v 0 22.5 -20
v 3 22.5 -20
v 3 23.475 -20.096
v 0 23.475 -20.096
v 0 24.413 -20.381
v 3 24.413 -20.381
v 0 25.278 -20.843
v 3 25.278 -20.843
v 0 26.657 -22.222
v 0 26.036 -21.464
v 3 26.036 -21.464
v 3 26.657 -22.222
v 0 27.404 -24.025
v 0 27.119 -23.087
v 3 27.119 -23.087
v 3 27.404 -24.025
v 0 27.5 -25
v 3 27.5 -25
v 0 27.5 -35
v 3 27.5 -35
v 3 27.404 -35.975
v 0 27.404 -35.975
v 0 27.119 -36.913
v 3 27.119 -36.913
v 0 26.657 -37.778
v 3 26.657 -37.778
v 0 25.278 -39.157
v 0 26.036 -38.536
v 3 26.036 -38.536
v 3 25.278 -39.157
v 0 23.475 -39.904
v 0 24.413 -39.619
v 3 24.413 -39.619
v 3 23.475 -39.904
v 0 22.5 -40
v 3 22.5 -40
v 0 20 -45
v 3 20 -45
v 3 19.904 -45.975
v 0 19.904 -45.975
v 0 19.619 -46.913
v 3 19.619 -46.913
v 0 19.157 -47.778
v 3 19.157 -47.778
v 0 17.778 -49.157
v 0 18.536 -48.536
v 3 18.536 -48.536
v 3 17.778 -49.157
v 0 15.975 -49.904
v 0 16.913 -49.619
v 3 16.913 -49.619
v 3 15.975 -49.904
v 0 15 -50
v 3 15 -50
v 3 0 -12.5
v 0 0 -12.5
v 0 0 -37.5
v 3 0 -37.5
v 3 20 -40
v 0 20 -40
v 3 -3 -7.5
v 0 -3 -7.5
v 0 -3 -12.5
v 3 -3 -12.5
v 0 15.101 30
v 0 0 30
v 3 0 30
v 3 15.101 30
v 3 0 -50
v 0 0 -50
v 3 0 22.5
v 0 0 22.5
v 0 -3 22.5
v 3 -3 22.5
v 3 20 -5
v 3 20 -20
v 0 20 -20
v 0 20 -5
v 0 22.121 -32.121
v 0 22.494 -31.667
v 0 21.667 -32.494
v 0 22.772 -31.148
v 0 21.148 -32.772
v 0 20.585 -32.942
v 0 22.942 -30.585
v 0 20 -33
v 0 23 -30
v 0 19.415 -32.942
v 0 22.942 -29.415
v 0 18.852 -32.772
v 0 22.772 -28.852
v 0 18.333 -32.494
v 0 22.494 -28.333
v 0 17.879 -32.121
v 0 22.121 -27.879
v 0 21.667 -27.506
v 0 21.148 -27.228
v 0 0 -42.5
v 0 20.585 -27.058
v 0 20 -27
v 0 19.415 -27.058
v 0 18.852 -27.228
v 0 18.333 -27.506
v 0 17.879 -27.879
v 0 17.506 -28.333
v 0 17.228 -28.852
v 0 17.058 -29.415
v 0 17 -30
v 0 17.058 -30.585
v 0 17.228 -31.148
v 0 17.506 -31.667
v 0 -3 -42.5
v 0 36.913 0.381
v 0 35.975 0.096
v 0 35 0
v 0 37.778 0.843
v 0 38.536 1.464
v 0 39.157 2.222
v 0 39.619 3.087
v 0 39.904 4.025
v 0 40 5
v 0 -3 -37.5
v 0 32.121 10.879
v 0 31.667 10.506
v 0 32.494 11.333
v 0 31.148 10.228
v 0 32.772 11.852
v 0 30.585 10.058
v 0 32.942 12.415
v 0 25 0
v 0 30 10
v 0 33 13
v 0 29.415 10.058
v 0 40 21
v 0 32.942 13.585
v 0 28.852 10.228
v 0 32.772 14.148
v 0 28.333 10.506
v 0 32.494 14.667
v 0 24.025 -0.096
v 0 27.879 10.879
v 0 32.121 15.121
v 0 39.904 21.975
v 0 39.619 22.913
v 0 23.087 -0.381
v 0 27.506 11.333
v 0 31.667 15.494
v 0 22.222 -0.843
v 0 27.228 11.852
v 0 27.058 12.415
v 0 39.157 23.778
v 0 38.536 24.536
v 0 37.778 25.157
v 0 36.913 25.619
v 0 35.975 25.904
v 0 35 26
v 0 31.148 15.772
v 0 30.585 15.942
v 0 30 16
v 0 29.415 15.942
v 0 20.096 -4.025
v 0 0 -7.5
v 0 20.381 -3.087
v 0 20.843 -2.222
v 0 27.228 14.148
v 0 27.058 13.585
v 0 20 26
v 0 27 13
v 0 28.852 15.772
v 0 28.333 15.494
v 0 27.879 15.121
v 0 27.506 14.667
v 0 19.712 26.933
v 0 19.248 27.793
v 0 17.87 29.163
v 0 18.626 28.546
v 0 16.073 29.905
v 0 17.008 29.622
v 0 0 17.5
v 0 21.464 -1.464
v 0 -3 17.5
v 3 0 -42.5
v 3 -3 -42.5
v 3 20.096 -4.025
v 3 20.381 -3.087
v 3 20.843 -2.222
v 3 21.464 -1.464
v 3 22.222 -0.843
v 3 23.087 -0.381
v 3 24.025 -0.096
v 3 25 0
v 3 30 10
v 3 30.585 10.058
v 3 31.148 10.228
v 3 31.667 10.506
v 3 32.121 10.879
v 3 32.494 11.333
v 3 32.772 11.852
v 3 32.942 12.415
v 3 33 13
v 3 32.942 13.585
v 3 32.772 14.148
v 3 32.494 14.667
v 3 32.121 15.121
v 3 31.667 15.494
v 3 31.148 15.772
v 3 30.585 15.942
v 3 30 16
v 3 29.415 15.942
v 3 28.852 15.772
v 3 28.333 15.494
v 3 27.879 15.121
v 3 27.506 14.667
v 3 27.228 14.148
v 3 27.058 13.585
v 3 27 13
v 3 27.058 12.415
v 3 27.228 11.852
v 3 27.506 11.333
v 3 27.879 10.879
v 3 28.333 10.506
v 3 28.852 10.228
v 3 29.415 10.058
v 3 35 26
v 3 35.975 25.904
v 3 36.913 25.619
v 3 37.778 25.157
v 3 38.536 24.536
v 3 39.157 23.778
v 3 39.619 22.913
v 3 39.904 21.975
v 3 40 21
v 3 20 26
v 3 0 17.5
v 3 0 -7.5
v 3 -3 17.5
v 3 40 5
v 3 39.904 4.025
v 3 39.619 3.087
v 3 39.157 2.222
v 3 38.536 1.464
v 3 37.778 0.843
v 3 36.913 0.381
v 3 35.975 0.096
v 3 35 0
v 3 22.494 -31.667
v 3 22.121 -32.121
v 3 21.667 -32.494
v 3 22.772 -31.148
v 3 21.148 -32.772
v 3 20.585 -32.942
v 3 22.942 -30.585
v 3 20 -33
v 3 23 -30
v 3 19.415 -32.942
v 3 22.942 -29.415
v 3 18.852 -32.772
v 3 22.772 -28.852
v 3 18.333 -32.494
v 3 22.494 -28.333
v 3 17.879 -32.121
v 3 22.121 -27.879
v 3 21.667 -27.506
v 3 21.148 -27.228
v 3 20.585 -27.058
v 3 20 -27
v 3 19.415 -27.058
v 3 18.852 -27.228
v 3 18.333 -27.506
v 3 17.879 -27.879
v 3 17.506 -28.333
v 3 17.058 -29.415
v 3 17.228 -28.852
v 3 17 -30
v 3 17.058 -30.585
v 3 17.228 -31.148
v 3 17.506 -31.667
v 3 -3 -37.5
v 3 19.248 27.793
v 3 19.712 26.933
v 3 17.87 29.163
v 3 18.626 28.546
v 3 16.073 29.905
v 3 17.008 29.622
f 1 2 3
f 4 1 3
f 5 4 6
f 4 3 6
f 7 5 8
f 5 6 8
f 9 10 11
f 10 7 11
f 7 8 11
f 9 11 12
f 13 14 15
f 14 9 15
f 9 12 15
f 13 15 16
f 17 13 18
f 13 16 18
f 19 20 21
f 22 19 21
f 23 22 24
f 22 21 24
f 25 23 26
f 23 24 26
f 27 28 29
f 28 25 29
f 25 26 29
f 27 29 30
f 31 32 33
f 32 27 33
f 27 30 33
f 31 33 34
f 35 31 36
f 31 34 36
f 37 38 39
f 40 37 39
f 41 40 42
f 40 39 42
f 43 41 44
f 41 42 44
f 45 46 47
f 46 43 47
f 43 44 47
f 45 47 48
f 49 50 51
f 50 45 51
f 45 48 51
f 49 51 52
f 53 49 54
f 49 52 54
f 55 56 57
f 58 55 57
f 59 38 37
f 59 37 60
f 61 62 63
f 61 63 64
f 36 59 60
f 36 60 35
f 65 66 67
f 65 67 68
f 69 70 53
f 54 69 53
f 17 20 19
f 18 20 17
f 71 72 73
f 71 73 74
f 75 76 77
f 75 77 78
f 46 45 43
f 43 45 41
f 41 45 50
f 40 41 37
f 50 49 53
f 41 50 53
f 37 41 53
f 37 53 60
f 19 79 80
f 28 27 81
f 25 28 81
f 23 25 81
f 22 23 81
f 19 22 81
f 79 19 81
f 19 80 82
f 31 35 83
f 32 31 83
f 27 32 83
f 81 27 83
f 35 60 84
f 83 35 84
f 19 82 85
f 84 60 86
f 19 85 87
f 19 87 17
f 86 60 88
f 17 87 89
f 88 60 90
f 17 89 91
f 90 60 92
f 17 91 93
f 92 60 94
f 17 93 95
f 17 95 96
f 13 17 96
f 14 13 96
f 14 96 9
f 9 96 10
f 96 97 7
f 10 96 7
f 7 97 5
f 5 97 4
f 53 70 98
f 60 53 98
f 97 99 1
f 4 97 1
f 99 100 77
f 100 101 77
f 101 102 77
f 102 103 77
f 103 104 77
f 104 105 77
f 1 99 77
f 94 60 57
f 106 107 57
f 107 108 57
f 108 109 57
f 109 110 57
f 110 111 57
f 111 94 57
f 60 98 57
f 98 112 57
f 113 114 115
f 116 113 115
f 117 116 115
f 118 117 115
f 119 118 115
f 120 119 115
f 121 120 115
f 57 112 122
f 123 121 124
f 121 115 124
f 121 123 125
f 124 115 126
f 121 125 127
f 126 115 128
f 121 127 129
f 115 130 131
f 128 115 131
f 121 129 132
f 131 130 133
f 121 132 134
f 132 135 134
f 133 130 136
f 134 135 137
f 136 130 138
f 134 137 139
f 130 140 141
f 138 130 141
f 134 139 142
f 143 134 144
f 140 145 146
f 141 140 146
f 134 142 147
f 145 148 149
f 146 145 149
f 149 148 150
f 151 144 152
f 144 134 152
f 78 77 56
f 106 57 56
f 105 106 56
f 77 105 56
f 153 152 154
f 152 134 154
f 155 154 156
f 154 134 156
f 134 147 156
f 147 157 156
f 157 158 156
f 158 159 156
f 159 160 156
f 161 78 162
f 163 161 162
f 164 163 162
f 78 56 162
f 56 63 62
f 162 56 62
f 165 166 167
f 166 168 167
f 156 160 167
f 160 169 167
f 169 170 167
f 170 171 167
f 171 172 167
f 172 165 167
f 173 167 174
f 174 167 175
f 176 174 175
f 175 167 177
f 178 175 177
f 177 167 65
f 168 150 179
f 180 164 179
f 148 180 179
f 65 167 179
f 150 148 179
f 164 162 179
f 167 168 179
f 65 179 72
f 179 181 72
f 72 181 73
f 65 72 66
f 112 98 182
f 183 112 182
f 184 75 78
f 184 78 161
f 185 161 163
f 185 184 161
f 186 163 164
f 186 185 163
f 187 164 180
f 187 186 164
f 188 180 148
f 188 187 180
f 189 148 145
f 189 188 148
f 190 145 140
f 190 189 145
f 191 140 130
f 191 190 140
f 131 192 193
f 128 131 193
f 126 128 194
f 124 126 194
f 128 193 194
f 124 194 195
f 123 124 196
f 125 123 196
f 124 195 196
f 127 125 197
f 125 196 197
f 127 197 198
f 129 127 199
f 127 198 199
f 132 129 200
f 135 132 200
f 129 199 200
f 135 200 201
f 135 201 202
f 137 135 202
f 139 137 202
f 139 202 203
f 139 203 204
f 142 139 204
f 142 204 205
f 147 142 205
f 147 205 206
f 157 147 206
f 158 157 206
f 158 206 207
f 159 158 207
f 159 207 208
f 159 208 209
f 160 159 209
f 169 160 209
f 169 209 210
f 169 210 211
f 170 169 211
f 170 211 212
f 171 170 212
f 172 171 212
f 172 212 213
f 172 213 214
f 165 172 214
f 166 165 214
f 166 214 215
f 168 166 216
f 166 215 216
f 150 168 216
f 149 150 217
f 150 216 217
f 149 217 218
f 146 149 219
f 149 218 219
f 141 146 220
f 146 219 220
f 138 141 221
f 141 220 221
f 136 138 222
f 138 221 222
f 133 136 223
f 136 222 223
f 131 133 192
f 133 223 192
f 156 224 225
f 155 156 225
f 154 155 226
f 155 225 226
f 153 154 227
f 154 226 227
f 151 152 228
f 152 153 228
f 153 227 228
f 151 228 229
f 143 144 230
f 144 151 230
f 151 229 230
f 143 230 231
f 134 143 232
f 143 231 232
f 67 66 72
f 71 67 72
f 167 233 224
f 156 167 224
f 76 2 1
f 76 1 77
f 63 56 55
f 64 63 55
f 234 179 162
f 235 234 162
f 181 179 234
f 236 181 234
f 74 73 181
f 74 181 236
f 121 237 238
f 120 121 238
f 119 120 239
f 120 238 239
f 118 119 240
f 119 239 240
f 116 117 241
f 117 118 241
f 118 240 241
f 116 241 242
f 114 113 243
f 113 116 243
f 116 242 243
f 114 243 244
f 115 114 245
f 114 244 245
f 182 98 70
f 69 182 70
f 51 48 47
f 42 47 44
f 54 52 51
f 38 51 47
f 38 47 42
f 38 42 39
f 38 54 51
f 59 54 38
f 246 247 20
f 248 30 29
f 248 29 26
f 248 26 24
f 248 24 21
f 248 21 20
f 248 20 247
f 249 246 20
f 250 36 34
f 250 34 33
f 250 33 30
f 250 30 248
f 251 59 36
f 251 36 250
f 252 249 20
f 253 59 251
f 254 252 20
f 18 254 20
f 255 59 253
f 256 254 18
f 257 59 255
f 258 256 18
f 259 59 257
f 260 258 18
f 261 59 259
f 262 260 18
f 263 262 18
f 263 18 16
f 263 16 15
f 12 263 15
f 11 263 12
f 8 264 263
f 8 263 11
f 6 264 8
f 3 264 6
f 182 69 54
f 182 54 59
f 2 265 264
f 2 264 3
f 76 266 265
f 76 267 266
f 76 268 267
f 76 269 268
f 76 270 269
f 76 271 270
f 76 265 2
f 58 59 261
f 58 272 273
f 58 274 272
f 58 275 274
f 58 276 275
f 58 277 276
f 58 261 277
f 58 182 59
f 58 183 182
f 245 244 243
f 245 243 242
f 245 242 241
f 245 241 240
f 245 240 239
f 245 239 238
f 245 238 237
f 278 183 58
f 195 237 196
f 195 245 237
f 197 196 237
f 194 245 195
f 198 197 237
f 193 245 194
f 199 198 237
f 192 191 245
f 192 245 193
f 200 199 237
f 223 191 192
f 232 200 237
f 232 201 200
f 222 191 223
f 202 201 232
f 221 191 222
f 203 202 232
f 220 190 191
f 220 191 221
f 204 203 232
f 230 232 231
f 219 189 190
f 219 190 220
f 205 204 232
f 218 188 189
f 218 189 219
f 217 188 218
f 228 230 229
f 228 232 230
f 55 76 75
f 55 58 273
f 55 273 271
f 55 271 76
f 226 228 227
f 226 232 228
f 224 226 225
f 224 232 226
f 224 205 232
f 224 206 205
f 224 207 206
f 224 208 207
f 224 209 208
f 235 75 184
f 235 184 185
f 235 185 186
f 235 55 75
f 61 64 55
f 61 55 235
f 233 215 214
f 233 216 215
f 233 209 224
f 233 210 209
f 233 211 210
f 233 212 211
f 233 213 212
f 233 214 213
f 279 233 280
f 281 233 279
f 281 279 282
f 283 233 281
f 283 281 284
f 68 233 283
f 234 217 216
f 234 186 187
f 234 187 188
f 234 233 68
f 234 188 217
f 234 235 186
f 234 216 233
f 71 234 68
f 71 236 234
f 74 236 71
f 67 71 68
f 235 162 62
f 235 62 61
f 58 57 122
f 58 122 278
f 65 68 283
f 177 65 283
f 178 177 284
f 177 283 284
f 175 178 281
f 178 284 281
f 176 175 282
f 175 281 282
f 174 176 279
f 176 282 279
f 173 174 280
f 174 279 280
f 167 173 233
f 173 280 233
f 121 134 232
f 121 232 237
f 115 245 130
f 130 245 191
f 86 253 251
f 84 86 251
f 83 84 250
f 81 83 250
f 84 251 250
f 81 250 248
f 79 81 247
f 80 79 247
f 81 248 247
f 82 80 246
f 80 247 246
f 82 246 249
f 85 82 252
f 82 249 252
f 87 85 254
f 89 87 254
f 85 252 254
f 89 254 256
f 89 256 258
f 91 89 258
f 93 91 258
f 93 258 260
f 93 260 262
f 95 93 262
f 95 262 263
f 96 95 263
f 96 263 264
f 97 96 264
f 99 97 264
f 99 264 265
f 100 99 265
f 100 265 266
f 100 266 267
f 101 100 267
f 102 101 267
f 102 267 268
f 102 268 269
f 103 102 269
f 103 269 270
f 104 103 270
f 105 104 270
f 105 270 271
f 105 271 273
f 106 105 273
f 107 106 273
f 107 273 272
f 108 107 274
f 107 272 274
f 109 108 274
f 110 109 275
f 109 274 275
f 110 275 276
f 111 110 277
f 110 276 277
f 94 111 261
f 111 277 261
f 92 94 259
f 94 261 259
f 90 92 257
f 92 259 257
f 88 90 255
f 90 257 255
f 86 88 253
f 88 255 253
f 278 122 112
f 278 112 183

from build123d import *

# Parameters (mm, degrees)
SKETCH1_W           = 80
SKETCH1_H           = 40
BOSS_EXTRUDE1_DEPTH = 3
SKETCH2_R           = 3
SKETCH2_W           = 4
SKETCH2_H           = 20
CUT_EXTRUDE1_DEPTH  = 65.101482042
FILLET2_R           = 5
SKETCH3_W           = 3
SKETCH3_H           = 5
BOSS_EXTRUDE2_DEPTH = 3
LPATTERN1_COUNT     = 3
LPATTERN1_PITCH     = 30


with BuildPart() as part:
    # Sketch1 → Boss-Extrude1 (new body)
    with BuildSketch(Plane(origin=(0, 0, 0), x_dir=(0, 0, -1), z_dir=(1, 0, 0))):
        with Locations((10, 20)):
            Rectangle(SKETCH1_W, SKETCH1_H)
    extrude(amount=BOSS_EXTRUDE1_DEPTH)

    # Sketch2 → Cut-Extrude1 (cut, through all)
    with BuildSketch(Plane(origin=(3, 0, 0), x_dir=(0, 0, -1), z_dir=(1, 0, 0))):
        with Locations((30, 20)):
            Circle(SKETCH2_R)
        with Locations((-13, 30)):
            Circle(SKETCH2_R)
        Polygon((0, 40), (50, 40), (50, 27.5), (50, 20), (40, 20), (40, 27.5), (20, 27.5), (20, 20), (0, 20), (0, 27.5), align=None)
        with Locations((-28, 30)):
            Rectangle(SKETCH2_W, SKETCH2_H)
    extrude(amount=-CUT_EXTRUDE1_DEPTH, mode=Mode.SUBTRACT)

    # Fillet2
    # the kernel refuses this fillet: 5 mm, written as the material it adds along each edge
    with BuildSketch(Plane(origin=(3, 20, 0), x_dir=(0, 0, -1), z_dir=(-1, 0, 0))) as fillet2_piece_1:
        with BuildLine():
            CenterArc((FILLET2_R, -FILLET2_R), FILLET2_R, 90, 90)
            Line((0, -FILLET2_R), (0, 0))
            Line((0, 0), (FILLET2_R, 0))
        make_face()
    extrude(amount=3)
    # the kernel refuses this fillet: 5 mm, written as the material it takes off along each edge
    with BuildSketch(Plane(origin=(15.5, 40, 26), x_dir=(0, 0, -1), z_dir=(-1, 0, 0)), Plane(origin=(15.5, 27.5, -40), x_dir=(0, -1, 0), z_dir=(-1, 0, 0)), Plane(origin=(15.5, 27.5, -20), x_dir=(0, 0, -1), z_dir=(-1, 0, 0)), Plane(origin=(15.5, 40, 0), x_dir=(0, -1, 0), z_dir=(-1, 0, 0)), Plane(origin=(15.5, 20, -50), x_dir=(0, -1, 0), z_dir=(-1, 0, 0))) as fillet2_2_piece_1:
        with BuildLine():
            CenterArc((FILLET2_R, FILLET2_R), FILLET2_R, 180, 90)
            Line((0, FILLET2_R), (0, 0))
            Line((0, 0), (FILLET2_R, 0))
        make_face()
    extrude(amount=28, mode=Mode.SUBTRACT)
    with BuildSketch(Plane(origin=(15.247448714, 20, 30), x_dir=(0, -1, 0), z_dir=(-1, 0, 0))) as fillet2_2_piece_2:
        with BuildLine():
            CenterArc((4.898979486, -5), FILLET2_R, 90, 78.463040967)
            Line((0, -4), (0, 0))
            Line((0, 0), (4.898979486, 0))
        make_face()
    extrude(amount=27.494897428, mode=Mode.SUBTRACT)

    # Sketch3 → Boss-Extrude2 (add)
    with BuildSketch(Plane.XZ):
        with Locations((1.5, -40)):
            Rectangle(SKETCH3_W, SKETCH3_H)
    boss_extrude2 = extrude(amount=BOSS_EXTRUDE2_DEPTH)

    # LPattern1: Boss-Extrude2 ×3
    with Locations(*[(0, 0, i * LPATTERN1_PITCH) for i in range(1, LPATTERN1_COUNT)]):
        add(boss_extrude2)


solid = part.part
